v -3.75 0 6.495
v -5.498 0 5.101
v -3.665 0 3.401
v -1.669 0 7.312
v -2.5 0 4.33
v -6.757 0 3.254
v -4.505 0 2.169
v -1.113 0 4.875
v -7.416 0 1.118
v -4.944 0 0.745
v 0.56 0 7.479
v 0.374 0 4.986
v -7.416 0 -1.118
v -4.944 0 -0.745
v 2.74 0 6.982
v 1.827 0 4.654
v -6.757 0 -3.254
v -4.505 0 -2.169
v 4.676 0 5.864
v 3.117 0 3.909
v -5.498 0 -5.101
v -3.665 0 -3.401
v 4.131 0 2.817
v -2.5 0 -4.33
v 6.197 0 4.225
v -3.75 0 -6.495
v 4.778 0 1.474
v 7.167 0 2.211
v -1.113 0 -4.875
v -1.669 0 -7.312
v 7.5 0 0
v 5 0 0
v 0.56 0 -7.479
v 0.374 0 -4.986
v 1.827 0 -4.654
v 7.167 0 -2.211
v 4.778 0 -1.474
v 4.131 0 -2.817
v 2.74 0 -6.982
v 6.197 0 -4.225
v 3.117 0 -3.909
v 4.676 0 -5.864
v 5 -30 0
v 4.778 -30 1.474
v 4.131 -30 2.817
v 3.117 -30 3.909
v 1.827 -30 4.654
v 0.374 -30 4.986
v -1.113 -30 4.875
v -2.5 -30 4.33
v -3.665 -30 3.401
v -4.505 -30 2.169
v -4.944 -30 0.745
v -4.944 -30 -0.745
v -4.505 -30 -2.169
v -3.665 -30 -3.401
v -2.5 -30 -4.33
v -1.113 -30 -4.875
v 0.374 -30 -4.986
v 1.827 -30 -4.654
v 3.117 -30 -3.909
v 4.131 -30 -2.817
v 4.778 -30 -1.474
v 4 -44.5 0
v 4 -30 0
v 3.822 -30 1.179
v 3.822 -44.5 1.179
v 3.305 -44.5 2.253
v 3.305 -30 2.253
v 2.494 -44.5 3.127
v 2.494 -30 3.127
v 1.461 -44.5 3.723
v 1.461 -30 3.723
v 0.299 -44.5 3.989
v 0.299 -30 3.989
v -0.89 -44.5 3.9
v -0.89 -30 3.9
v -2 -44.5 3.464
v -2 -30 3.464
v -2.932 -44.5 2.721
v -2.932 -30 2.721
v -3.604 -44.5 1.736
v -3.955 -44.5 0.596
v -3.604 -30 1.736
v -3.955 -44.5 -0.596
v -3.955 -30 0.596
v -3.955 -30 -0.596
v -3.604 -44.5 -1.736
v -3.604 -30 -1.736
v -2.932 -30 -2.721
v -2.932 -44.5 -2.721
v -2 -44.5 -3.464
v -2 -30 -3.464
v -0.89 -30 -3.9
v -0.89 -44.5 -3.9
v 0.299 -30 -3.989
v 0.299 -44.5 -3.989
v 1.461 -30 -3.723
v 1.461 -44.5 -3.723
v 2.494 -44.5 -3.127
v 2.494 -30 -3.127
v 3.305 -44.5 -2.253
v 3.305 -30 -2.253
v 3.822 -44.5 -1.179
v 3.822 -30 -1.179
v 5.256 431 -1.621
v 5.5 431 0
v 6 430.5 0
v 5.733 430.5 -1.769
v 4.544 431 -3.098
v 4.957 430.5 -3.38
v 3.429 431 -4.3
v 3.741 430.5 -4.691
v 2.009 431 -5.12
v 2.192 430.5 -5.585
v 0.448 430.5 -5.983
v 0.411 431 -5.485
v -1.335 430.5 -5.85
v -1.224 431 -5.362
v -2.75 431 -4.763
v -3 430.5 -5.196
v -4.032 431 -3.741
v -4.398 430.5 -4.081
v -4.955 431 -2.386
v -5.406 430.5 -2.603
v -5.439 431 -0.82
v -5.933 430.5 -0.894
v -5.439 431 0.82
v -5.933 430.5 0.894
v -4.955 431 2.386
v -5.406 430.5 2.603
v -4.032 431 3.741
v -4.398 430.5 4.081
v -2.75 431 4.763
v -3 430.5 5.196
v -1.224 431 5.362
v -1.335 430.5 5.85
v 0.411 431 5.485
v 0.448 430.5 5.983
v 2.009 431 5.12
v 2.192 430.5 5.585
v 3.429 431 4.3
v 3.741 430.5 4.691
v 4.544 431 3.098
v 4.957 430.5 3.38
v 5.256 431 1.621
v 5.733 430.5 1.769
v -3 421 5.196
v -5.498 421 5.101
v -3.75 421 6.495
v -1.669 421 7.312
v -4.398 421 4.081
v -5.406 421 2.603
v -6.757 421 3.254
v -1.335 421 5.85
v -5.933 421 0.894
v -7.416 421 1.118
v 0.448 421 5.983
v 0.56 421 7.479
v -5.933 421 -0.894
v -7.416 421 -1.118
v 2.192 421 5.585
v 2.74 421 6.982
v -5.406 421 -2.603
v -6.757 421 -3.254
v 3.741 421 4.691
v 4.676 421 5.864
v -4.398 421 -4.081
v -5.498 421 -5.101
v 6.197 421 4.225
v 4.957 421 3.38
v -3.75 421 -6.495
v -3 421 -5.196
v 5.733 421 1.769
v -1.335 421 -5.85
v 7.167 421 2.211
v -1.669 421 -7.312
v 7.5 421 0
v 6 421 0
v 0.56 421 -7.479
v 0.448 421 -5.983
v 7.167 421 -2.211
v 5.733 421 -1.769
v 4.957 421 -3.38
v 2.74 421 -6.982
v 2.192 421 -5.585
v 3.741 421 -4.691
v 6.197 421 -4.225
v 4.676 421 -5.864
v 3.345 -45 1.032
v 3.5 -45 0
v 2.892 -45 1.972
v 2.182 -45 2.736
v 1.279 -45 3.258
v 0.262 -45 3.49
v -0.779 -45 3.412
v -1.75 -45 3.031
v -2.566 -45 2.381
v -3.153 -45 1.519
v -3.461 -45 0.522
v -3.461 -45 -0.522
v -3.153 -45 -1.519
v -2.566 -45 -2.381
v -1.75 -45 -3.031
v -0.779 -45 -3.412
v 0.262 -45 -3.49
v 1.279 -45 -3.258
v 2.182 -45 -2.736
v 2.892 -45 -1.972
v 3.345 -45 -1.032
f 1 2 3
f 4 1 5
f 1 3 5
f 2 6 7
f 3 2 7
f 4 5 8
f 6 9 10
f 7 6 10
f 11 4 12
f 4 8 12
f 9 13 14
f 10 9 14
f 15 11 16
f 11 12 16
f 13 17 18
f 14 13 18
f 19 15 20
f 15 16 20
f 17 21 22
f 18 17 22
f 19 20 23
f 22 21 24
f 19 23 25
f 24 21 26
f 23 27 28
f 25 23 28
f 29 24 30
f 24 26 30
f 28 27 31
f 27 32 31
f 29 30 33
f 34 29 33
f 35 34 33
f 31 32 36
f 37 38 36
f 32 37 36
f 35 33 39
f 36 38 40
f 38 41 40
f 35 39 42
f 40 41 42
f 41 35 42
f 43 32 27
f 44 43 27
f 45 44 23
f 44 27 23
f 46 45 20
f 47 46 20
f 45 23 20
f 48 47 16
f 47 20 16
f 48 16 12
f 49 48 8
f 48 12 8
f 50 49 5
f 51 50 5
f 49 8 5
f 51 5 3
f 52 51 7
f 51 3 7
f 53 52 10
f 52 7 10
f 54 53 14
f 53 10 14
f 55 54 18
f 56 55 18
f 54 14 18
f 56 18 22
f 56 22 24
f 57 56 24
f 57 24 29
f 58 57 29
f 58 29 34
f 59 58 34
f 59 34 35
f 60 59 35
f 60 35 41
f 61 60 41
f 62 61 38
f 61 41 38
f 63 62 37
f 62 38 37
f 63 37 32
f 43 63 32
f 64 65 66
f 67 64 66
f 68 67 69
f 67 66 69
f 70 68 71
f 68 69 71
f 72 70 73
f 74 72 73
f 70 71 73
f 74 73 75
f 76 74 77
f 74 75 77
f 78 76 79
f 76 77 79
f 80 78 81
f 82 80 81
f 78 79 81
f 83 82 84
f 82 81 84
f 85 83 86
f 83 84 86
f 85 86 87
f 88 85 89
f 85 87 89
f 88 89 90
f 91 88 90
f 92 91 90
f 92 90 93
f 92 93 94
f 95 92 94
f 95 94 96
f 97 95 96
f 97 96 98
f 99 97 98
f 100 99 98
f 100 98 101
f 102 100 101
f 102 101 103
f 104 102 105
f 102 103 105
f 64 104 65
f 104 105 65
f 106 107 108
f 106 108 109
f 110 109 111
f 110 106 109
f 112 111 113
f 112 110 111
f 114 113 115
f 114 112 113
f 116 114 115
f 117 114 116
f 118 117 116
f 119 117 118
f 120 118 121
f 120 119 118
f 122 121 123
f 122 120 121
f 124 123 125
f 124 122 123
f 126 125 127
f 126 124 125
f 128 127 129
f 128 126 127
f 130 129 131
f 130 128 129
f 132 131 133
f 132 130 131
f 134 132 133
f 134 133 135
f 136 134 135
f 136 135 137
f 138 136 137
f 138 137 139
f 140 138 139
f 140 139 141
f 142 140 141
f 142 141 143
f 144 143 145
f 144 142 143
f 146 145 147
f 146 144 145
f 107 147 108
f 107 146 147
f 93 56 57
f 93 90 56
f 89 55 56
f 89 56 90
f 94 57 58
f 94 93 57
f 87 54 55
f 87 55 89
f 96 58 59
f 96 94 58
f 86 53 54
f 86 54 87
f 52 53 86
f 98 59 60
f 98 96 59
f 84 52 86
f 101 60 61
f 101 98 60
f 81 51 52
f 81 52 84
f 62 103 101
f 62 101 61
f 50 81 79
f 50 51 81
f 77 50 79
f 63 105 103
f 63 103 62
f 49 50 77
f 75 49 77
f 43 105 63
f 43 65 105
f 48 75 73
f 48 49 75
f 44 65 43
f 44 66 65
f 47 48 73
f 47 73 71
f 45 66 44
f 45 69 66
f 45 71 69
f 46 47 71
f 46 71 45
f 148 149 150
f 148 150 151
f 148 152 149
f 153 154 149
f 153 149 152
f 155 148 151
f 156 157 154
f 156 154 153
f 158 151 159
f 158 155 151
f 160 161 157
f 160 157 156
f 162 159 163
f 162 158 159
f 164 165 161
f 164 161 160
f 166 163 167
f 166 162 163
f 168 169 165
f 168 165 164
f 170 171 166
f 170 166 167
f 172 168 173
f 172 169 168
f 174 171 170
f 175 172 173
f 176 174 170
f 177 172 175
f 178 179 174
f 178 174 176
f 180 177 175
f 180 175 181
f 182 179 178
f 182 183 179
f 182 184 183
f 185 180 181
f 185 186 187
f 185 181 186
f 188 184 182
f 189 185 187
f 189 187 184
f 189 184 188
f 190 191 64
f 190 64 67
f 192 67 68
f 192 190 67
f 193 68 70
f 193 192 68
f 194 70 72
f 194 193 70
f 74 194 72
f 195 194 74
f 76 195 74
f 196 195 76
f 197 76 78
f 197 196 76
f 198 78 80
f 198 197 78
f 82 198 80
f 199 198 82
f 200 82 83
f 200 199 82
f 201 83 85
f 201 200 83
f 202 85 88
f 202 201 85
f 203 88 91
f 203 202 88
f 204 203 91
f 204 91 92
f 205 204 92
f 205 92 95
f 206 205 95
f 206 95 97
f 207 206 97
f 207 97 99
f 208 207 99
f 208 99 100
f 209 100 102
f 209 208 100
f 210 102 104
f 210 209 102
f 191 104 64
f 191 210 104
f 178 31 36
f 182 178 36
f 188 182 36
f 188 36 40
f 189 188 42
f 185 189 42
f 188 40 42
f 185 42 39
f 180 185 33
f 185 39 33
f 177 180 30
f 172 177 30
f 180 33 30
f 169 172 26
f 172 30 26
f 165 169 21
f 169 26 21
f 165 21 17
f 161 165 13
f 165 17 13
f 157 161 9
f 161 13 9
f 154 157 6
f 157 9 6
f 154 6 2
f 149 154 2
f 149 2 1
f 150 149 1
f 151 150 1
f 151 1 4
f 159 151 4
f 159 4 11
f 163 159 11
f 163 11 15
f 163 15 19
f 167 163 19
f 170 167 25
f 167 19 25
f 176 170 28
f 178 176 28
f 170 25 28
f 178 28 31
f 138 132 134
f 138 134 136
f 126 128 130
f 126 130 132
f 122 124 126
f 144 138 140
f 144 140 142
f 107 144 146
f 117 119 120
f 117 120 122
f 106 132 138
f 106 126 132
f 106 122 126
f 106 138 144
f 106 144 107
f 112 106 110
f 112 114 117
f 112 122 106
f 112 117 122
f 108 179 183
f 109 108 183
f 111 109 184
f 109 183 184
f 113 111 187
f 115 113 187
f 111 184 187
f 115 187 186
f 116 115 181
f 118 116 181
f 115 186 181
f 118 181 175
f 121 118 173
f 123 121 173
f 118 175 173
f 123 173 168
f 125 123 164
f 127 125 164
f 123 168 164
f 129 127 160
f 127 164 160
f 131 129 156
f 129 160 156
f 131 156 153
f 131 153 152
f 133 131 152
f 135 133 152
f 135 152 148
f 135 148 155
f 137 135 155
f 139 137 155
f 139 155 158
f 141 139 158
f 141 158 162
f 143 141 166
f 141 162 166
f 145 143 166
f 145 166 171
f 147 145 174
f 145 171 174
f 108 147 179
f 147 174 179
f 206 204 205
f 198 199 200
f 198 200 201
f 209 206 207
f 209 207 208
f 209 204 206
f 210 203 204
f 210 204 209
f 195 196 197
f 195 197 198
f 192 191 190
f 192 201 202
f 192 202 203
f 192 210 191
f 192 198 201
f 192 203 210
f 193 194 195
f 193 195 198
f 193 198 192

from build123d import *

# Parameters (mm, degrees)
SKETCH4_R           = 7.5
BOSS_EXTRUDE1_DEPTH = 421
SKETCH5_R           = 6
BOSS_EXTRUDE2_DEPTH = 10
CHAMFER1_SIZE       = 0.5
SKETCH6_R           = 5
BOSS_EXTRUDE3_DEPTH = 30
SKETCH7_R           = 4
BOSS_EXTRUDE4_DEPTH = 15
CHAMFER2_SIZE       = 0.5


with BuildPart() as part:
    # Sketch4 → Boss-Extrude1 (new body)
    with BuildSketch(Plane(origin=(0, 0, 0), x_dir=(1, 0, 0), z_dir=(0, 1, 0))):
        Circle(SKETCH4_R)
    extrude(amount=BOSS_EXTRUDE1_DEPTH)

    # Sketch5 → Boss-Extrude2 (add)
    with BuildSketch(Plane(origin=(0, 421, 0), x_dir=(1, 0, 0), z_dir=(0, 1, 0))):
        Circle(SKETCH5_R)
    extrude(amount=BOSS_EXTRUDE2_DEPTH)

    # Chamfer1
    chamfer1_edges = [part.edges().sort_by_distance(p)[0] for p in [
        (-6, 431, 0),
    ]]
    chamfer(chamfer1_edges, length=CHAMFER1_SIZE)

    # Sketch6 → Boss-Extrude3 (add)
    with BuildSketch(Plane.XZ):
        Circle(SKETCH6_R)
    extrude(amount=BOSS_EXTRUDE3_DEPTH)

    # Sketch7 → Boss-Extrude4 (add)
    with BuildSketch(Plane.XZ.offset(30)):
        Circle(SKETCH7_R)
    extrude(amount=BOSS_EXTRUDE4_DEPTH)

    # Chamfer2
    chamfer2_edges = [part.edges().sort_by_distance(p)[0] for p in [
        (-4, -45, 0),
    ]]
    chamfer(chamfer2_edges, length=CHAMFER2_SIZE)


solid = part.part
